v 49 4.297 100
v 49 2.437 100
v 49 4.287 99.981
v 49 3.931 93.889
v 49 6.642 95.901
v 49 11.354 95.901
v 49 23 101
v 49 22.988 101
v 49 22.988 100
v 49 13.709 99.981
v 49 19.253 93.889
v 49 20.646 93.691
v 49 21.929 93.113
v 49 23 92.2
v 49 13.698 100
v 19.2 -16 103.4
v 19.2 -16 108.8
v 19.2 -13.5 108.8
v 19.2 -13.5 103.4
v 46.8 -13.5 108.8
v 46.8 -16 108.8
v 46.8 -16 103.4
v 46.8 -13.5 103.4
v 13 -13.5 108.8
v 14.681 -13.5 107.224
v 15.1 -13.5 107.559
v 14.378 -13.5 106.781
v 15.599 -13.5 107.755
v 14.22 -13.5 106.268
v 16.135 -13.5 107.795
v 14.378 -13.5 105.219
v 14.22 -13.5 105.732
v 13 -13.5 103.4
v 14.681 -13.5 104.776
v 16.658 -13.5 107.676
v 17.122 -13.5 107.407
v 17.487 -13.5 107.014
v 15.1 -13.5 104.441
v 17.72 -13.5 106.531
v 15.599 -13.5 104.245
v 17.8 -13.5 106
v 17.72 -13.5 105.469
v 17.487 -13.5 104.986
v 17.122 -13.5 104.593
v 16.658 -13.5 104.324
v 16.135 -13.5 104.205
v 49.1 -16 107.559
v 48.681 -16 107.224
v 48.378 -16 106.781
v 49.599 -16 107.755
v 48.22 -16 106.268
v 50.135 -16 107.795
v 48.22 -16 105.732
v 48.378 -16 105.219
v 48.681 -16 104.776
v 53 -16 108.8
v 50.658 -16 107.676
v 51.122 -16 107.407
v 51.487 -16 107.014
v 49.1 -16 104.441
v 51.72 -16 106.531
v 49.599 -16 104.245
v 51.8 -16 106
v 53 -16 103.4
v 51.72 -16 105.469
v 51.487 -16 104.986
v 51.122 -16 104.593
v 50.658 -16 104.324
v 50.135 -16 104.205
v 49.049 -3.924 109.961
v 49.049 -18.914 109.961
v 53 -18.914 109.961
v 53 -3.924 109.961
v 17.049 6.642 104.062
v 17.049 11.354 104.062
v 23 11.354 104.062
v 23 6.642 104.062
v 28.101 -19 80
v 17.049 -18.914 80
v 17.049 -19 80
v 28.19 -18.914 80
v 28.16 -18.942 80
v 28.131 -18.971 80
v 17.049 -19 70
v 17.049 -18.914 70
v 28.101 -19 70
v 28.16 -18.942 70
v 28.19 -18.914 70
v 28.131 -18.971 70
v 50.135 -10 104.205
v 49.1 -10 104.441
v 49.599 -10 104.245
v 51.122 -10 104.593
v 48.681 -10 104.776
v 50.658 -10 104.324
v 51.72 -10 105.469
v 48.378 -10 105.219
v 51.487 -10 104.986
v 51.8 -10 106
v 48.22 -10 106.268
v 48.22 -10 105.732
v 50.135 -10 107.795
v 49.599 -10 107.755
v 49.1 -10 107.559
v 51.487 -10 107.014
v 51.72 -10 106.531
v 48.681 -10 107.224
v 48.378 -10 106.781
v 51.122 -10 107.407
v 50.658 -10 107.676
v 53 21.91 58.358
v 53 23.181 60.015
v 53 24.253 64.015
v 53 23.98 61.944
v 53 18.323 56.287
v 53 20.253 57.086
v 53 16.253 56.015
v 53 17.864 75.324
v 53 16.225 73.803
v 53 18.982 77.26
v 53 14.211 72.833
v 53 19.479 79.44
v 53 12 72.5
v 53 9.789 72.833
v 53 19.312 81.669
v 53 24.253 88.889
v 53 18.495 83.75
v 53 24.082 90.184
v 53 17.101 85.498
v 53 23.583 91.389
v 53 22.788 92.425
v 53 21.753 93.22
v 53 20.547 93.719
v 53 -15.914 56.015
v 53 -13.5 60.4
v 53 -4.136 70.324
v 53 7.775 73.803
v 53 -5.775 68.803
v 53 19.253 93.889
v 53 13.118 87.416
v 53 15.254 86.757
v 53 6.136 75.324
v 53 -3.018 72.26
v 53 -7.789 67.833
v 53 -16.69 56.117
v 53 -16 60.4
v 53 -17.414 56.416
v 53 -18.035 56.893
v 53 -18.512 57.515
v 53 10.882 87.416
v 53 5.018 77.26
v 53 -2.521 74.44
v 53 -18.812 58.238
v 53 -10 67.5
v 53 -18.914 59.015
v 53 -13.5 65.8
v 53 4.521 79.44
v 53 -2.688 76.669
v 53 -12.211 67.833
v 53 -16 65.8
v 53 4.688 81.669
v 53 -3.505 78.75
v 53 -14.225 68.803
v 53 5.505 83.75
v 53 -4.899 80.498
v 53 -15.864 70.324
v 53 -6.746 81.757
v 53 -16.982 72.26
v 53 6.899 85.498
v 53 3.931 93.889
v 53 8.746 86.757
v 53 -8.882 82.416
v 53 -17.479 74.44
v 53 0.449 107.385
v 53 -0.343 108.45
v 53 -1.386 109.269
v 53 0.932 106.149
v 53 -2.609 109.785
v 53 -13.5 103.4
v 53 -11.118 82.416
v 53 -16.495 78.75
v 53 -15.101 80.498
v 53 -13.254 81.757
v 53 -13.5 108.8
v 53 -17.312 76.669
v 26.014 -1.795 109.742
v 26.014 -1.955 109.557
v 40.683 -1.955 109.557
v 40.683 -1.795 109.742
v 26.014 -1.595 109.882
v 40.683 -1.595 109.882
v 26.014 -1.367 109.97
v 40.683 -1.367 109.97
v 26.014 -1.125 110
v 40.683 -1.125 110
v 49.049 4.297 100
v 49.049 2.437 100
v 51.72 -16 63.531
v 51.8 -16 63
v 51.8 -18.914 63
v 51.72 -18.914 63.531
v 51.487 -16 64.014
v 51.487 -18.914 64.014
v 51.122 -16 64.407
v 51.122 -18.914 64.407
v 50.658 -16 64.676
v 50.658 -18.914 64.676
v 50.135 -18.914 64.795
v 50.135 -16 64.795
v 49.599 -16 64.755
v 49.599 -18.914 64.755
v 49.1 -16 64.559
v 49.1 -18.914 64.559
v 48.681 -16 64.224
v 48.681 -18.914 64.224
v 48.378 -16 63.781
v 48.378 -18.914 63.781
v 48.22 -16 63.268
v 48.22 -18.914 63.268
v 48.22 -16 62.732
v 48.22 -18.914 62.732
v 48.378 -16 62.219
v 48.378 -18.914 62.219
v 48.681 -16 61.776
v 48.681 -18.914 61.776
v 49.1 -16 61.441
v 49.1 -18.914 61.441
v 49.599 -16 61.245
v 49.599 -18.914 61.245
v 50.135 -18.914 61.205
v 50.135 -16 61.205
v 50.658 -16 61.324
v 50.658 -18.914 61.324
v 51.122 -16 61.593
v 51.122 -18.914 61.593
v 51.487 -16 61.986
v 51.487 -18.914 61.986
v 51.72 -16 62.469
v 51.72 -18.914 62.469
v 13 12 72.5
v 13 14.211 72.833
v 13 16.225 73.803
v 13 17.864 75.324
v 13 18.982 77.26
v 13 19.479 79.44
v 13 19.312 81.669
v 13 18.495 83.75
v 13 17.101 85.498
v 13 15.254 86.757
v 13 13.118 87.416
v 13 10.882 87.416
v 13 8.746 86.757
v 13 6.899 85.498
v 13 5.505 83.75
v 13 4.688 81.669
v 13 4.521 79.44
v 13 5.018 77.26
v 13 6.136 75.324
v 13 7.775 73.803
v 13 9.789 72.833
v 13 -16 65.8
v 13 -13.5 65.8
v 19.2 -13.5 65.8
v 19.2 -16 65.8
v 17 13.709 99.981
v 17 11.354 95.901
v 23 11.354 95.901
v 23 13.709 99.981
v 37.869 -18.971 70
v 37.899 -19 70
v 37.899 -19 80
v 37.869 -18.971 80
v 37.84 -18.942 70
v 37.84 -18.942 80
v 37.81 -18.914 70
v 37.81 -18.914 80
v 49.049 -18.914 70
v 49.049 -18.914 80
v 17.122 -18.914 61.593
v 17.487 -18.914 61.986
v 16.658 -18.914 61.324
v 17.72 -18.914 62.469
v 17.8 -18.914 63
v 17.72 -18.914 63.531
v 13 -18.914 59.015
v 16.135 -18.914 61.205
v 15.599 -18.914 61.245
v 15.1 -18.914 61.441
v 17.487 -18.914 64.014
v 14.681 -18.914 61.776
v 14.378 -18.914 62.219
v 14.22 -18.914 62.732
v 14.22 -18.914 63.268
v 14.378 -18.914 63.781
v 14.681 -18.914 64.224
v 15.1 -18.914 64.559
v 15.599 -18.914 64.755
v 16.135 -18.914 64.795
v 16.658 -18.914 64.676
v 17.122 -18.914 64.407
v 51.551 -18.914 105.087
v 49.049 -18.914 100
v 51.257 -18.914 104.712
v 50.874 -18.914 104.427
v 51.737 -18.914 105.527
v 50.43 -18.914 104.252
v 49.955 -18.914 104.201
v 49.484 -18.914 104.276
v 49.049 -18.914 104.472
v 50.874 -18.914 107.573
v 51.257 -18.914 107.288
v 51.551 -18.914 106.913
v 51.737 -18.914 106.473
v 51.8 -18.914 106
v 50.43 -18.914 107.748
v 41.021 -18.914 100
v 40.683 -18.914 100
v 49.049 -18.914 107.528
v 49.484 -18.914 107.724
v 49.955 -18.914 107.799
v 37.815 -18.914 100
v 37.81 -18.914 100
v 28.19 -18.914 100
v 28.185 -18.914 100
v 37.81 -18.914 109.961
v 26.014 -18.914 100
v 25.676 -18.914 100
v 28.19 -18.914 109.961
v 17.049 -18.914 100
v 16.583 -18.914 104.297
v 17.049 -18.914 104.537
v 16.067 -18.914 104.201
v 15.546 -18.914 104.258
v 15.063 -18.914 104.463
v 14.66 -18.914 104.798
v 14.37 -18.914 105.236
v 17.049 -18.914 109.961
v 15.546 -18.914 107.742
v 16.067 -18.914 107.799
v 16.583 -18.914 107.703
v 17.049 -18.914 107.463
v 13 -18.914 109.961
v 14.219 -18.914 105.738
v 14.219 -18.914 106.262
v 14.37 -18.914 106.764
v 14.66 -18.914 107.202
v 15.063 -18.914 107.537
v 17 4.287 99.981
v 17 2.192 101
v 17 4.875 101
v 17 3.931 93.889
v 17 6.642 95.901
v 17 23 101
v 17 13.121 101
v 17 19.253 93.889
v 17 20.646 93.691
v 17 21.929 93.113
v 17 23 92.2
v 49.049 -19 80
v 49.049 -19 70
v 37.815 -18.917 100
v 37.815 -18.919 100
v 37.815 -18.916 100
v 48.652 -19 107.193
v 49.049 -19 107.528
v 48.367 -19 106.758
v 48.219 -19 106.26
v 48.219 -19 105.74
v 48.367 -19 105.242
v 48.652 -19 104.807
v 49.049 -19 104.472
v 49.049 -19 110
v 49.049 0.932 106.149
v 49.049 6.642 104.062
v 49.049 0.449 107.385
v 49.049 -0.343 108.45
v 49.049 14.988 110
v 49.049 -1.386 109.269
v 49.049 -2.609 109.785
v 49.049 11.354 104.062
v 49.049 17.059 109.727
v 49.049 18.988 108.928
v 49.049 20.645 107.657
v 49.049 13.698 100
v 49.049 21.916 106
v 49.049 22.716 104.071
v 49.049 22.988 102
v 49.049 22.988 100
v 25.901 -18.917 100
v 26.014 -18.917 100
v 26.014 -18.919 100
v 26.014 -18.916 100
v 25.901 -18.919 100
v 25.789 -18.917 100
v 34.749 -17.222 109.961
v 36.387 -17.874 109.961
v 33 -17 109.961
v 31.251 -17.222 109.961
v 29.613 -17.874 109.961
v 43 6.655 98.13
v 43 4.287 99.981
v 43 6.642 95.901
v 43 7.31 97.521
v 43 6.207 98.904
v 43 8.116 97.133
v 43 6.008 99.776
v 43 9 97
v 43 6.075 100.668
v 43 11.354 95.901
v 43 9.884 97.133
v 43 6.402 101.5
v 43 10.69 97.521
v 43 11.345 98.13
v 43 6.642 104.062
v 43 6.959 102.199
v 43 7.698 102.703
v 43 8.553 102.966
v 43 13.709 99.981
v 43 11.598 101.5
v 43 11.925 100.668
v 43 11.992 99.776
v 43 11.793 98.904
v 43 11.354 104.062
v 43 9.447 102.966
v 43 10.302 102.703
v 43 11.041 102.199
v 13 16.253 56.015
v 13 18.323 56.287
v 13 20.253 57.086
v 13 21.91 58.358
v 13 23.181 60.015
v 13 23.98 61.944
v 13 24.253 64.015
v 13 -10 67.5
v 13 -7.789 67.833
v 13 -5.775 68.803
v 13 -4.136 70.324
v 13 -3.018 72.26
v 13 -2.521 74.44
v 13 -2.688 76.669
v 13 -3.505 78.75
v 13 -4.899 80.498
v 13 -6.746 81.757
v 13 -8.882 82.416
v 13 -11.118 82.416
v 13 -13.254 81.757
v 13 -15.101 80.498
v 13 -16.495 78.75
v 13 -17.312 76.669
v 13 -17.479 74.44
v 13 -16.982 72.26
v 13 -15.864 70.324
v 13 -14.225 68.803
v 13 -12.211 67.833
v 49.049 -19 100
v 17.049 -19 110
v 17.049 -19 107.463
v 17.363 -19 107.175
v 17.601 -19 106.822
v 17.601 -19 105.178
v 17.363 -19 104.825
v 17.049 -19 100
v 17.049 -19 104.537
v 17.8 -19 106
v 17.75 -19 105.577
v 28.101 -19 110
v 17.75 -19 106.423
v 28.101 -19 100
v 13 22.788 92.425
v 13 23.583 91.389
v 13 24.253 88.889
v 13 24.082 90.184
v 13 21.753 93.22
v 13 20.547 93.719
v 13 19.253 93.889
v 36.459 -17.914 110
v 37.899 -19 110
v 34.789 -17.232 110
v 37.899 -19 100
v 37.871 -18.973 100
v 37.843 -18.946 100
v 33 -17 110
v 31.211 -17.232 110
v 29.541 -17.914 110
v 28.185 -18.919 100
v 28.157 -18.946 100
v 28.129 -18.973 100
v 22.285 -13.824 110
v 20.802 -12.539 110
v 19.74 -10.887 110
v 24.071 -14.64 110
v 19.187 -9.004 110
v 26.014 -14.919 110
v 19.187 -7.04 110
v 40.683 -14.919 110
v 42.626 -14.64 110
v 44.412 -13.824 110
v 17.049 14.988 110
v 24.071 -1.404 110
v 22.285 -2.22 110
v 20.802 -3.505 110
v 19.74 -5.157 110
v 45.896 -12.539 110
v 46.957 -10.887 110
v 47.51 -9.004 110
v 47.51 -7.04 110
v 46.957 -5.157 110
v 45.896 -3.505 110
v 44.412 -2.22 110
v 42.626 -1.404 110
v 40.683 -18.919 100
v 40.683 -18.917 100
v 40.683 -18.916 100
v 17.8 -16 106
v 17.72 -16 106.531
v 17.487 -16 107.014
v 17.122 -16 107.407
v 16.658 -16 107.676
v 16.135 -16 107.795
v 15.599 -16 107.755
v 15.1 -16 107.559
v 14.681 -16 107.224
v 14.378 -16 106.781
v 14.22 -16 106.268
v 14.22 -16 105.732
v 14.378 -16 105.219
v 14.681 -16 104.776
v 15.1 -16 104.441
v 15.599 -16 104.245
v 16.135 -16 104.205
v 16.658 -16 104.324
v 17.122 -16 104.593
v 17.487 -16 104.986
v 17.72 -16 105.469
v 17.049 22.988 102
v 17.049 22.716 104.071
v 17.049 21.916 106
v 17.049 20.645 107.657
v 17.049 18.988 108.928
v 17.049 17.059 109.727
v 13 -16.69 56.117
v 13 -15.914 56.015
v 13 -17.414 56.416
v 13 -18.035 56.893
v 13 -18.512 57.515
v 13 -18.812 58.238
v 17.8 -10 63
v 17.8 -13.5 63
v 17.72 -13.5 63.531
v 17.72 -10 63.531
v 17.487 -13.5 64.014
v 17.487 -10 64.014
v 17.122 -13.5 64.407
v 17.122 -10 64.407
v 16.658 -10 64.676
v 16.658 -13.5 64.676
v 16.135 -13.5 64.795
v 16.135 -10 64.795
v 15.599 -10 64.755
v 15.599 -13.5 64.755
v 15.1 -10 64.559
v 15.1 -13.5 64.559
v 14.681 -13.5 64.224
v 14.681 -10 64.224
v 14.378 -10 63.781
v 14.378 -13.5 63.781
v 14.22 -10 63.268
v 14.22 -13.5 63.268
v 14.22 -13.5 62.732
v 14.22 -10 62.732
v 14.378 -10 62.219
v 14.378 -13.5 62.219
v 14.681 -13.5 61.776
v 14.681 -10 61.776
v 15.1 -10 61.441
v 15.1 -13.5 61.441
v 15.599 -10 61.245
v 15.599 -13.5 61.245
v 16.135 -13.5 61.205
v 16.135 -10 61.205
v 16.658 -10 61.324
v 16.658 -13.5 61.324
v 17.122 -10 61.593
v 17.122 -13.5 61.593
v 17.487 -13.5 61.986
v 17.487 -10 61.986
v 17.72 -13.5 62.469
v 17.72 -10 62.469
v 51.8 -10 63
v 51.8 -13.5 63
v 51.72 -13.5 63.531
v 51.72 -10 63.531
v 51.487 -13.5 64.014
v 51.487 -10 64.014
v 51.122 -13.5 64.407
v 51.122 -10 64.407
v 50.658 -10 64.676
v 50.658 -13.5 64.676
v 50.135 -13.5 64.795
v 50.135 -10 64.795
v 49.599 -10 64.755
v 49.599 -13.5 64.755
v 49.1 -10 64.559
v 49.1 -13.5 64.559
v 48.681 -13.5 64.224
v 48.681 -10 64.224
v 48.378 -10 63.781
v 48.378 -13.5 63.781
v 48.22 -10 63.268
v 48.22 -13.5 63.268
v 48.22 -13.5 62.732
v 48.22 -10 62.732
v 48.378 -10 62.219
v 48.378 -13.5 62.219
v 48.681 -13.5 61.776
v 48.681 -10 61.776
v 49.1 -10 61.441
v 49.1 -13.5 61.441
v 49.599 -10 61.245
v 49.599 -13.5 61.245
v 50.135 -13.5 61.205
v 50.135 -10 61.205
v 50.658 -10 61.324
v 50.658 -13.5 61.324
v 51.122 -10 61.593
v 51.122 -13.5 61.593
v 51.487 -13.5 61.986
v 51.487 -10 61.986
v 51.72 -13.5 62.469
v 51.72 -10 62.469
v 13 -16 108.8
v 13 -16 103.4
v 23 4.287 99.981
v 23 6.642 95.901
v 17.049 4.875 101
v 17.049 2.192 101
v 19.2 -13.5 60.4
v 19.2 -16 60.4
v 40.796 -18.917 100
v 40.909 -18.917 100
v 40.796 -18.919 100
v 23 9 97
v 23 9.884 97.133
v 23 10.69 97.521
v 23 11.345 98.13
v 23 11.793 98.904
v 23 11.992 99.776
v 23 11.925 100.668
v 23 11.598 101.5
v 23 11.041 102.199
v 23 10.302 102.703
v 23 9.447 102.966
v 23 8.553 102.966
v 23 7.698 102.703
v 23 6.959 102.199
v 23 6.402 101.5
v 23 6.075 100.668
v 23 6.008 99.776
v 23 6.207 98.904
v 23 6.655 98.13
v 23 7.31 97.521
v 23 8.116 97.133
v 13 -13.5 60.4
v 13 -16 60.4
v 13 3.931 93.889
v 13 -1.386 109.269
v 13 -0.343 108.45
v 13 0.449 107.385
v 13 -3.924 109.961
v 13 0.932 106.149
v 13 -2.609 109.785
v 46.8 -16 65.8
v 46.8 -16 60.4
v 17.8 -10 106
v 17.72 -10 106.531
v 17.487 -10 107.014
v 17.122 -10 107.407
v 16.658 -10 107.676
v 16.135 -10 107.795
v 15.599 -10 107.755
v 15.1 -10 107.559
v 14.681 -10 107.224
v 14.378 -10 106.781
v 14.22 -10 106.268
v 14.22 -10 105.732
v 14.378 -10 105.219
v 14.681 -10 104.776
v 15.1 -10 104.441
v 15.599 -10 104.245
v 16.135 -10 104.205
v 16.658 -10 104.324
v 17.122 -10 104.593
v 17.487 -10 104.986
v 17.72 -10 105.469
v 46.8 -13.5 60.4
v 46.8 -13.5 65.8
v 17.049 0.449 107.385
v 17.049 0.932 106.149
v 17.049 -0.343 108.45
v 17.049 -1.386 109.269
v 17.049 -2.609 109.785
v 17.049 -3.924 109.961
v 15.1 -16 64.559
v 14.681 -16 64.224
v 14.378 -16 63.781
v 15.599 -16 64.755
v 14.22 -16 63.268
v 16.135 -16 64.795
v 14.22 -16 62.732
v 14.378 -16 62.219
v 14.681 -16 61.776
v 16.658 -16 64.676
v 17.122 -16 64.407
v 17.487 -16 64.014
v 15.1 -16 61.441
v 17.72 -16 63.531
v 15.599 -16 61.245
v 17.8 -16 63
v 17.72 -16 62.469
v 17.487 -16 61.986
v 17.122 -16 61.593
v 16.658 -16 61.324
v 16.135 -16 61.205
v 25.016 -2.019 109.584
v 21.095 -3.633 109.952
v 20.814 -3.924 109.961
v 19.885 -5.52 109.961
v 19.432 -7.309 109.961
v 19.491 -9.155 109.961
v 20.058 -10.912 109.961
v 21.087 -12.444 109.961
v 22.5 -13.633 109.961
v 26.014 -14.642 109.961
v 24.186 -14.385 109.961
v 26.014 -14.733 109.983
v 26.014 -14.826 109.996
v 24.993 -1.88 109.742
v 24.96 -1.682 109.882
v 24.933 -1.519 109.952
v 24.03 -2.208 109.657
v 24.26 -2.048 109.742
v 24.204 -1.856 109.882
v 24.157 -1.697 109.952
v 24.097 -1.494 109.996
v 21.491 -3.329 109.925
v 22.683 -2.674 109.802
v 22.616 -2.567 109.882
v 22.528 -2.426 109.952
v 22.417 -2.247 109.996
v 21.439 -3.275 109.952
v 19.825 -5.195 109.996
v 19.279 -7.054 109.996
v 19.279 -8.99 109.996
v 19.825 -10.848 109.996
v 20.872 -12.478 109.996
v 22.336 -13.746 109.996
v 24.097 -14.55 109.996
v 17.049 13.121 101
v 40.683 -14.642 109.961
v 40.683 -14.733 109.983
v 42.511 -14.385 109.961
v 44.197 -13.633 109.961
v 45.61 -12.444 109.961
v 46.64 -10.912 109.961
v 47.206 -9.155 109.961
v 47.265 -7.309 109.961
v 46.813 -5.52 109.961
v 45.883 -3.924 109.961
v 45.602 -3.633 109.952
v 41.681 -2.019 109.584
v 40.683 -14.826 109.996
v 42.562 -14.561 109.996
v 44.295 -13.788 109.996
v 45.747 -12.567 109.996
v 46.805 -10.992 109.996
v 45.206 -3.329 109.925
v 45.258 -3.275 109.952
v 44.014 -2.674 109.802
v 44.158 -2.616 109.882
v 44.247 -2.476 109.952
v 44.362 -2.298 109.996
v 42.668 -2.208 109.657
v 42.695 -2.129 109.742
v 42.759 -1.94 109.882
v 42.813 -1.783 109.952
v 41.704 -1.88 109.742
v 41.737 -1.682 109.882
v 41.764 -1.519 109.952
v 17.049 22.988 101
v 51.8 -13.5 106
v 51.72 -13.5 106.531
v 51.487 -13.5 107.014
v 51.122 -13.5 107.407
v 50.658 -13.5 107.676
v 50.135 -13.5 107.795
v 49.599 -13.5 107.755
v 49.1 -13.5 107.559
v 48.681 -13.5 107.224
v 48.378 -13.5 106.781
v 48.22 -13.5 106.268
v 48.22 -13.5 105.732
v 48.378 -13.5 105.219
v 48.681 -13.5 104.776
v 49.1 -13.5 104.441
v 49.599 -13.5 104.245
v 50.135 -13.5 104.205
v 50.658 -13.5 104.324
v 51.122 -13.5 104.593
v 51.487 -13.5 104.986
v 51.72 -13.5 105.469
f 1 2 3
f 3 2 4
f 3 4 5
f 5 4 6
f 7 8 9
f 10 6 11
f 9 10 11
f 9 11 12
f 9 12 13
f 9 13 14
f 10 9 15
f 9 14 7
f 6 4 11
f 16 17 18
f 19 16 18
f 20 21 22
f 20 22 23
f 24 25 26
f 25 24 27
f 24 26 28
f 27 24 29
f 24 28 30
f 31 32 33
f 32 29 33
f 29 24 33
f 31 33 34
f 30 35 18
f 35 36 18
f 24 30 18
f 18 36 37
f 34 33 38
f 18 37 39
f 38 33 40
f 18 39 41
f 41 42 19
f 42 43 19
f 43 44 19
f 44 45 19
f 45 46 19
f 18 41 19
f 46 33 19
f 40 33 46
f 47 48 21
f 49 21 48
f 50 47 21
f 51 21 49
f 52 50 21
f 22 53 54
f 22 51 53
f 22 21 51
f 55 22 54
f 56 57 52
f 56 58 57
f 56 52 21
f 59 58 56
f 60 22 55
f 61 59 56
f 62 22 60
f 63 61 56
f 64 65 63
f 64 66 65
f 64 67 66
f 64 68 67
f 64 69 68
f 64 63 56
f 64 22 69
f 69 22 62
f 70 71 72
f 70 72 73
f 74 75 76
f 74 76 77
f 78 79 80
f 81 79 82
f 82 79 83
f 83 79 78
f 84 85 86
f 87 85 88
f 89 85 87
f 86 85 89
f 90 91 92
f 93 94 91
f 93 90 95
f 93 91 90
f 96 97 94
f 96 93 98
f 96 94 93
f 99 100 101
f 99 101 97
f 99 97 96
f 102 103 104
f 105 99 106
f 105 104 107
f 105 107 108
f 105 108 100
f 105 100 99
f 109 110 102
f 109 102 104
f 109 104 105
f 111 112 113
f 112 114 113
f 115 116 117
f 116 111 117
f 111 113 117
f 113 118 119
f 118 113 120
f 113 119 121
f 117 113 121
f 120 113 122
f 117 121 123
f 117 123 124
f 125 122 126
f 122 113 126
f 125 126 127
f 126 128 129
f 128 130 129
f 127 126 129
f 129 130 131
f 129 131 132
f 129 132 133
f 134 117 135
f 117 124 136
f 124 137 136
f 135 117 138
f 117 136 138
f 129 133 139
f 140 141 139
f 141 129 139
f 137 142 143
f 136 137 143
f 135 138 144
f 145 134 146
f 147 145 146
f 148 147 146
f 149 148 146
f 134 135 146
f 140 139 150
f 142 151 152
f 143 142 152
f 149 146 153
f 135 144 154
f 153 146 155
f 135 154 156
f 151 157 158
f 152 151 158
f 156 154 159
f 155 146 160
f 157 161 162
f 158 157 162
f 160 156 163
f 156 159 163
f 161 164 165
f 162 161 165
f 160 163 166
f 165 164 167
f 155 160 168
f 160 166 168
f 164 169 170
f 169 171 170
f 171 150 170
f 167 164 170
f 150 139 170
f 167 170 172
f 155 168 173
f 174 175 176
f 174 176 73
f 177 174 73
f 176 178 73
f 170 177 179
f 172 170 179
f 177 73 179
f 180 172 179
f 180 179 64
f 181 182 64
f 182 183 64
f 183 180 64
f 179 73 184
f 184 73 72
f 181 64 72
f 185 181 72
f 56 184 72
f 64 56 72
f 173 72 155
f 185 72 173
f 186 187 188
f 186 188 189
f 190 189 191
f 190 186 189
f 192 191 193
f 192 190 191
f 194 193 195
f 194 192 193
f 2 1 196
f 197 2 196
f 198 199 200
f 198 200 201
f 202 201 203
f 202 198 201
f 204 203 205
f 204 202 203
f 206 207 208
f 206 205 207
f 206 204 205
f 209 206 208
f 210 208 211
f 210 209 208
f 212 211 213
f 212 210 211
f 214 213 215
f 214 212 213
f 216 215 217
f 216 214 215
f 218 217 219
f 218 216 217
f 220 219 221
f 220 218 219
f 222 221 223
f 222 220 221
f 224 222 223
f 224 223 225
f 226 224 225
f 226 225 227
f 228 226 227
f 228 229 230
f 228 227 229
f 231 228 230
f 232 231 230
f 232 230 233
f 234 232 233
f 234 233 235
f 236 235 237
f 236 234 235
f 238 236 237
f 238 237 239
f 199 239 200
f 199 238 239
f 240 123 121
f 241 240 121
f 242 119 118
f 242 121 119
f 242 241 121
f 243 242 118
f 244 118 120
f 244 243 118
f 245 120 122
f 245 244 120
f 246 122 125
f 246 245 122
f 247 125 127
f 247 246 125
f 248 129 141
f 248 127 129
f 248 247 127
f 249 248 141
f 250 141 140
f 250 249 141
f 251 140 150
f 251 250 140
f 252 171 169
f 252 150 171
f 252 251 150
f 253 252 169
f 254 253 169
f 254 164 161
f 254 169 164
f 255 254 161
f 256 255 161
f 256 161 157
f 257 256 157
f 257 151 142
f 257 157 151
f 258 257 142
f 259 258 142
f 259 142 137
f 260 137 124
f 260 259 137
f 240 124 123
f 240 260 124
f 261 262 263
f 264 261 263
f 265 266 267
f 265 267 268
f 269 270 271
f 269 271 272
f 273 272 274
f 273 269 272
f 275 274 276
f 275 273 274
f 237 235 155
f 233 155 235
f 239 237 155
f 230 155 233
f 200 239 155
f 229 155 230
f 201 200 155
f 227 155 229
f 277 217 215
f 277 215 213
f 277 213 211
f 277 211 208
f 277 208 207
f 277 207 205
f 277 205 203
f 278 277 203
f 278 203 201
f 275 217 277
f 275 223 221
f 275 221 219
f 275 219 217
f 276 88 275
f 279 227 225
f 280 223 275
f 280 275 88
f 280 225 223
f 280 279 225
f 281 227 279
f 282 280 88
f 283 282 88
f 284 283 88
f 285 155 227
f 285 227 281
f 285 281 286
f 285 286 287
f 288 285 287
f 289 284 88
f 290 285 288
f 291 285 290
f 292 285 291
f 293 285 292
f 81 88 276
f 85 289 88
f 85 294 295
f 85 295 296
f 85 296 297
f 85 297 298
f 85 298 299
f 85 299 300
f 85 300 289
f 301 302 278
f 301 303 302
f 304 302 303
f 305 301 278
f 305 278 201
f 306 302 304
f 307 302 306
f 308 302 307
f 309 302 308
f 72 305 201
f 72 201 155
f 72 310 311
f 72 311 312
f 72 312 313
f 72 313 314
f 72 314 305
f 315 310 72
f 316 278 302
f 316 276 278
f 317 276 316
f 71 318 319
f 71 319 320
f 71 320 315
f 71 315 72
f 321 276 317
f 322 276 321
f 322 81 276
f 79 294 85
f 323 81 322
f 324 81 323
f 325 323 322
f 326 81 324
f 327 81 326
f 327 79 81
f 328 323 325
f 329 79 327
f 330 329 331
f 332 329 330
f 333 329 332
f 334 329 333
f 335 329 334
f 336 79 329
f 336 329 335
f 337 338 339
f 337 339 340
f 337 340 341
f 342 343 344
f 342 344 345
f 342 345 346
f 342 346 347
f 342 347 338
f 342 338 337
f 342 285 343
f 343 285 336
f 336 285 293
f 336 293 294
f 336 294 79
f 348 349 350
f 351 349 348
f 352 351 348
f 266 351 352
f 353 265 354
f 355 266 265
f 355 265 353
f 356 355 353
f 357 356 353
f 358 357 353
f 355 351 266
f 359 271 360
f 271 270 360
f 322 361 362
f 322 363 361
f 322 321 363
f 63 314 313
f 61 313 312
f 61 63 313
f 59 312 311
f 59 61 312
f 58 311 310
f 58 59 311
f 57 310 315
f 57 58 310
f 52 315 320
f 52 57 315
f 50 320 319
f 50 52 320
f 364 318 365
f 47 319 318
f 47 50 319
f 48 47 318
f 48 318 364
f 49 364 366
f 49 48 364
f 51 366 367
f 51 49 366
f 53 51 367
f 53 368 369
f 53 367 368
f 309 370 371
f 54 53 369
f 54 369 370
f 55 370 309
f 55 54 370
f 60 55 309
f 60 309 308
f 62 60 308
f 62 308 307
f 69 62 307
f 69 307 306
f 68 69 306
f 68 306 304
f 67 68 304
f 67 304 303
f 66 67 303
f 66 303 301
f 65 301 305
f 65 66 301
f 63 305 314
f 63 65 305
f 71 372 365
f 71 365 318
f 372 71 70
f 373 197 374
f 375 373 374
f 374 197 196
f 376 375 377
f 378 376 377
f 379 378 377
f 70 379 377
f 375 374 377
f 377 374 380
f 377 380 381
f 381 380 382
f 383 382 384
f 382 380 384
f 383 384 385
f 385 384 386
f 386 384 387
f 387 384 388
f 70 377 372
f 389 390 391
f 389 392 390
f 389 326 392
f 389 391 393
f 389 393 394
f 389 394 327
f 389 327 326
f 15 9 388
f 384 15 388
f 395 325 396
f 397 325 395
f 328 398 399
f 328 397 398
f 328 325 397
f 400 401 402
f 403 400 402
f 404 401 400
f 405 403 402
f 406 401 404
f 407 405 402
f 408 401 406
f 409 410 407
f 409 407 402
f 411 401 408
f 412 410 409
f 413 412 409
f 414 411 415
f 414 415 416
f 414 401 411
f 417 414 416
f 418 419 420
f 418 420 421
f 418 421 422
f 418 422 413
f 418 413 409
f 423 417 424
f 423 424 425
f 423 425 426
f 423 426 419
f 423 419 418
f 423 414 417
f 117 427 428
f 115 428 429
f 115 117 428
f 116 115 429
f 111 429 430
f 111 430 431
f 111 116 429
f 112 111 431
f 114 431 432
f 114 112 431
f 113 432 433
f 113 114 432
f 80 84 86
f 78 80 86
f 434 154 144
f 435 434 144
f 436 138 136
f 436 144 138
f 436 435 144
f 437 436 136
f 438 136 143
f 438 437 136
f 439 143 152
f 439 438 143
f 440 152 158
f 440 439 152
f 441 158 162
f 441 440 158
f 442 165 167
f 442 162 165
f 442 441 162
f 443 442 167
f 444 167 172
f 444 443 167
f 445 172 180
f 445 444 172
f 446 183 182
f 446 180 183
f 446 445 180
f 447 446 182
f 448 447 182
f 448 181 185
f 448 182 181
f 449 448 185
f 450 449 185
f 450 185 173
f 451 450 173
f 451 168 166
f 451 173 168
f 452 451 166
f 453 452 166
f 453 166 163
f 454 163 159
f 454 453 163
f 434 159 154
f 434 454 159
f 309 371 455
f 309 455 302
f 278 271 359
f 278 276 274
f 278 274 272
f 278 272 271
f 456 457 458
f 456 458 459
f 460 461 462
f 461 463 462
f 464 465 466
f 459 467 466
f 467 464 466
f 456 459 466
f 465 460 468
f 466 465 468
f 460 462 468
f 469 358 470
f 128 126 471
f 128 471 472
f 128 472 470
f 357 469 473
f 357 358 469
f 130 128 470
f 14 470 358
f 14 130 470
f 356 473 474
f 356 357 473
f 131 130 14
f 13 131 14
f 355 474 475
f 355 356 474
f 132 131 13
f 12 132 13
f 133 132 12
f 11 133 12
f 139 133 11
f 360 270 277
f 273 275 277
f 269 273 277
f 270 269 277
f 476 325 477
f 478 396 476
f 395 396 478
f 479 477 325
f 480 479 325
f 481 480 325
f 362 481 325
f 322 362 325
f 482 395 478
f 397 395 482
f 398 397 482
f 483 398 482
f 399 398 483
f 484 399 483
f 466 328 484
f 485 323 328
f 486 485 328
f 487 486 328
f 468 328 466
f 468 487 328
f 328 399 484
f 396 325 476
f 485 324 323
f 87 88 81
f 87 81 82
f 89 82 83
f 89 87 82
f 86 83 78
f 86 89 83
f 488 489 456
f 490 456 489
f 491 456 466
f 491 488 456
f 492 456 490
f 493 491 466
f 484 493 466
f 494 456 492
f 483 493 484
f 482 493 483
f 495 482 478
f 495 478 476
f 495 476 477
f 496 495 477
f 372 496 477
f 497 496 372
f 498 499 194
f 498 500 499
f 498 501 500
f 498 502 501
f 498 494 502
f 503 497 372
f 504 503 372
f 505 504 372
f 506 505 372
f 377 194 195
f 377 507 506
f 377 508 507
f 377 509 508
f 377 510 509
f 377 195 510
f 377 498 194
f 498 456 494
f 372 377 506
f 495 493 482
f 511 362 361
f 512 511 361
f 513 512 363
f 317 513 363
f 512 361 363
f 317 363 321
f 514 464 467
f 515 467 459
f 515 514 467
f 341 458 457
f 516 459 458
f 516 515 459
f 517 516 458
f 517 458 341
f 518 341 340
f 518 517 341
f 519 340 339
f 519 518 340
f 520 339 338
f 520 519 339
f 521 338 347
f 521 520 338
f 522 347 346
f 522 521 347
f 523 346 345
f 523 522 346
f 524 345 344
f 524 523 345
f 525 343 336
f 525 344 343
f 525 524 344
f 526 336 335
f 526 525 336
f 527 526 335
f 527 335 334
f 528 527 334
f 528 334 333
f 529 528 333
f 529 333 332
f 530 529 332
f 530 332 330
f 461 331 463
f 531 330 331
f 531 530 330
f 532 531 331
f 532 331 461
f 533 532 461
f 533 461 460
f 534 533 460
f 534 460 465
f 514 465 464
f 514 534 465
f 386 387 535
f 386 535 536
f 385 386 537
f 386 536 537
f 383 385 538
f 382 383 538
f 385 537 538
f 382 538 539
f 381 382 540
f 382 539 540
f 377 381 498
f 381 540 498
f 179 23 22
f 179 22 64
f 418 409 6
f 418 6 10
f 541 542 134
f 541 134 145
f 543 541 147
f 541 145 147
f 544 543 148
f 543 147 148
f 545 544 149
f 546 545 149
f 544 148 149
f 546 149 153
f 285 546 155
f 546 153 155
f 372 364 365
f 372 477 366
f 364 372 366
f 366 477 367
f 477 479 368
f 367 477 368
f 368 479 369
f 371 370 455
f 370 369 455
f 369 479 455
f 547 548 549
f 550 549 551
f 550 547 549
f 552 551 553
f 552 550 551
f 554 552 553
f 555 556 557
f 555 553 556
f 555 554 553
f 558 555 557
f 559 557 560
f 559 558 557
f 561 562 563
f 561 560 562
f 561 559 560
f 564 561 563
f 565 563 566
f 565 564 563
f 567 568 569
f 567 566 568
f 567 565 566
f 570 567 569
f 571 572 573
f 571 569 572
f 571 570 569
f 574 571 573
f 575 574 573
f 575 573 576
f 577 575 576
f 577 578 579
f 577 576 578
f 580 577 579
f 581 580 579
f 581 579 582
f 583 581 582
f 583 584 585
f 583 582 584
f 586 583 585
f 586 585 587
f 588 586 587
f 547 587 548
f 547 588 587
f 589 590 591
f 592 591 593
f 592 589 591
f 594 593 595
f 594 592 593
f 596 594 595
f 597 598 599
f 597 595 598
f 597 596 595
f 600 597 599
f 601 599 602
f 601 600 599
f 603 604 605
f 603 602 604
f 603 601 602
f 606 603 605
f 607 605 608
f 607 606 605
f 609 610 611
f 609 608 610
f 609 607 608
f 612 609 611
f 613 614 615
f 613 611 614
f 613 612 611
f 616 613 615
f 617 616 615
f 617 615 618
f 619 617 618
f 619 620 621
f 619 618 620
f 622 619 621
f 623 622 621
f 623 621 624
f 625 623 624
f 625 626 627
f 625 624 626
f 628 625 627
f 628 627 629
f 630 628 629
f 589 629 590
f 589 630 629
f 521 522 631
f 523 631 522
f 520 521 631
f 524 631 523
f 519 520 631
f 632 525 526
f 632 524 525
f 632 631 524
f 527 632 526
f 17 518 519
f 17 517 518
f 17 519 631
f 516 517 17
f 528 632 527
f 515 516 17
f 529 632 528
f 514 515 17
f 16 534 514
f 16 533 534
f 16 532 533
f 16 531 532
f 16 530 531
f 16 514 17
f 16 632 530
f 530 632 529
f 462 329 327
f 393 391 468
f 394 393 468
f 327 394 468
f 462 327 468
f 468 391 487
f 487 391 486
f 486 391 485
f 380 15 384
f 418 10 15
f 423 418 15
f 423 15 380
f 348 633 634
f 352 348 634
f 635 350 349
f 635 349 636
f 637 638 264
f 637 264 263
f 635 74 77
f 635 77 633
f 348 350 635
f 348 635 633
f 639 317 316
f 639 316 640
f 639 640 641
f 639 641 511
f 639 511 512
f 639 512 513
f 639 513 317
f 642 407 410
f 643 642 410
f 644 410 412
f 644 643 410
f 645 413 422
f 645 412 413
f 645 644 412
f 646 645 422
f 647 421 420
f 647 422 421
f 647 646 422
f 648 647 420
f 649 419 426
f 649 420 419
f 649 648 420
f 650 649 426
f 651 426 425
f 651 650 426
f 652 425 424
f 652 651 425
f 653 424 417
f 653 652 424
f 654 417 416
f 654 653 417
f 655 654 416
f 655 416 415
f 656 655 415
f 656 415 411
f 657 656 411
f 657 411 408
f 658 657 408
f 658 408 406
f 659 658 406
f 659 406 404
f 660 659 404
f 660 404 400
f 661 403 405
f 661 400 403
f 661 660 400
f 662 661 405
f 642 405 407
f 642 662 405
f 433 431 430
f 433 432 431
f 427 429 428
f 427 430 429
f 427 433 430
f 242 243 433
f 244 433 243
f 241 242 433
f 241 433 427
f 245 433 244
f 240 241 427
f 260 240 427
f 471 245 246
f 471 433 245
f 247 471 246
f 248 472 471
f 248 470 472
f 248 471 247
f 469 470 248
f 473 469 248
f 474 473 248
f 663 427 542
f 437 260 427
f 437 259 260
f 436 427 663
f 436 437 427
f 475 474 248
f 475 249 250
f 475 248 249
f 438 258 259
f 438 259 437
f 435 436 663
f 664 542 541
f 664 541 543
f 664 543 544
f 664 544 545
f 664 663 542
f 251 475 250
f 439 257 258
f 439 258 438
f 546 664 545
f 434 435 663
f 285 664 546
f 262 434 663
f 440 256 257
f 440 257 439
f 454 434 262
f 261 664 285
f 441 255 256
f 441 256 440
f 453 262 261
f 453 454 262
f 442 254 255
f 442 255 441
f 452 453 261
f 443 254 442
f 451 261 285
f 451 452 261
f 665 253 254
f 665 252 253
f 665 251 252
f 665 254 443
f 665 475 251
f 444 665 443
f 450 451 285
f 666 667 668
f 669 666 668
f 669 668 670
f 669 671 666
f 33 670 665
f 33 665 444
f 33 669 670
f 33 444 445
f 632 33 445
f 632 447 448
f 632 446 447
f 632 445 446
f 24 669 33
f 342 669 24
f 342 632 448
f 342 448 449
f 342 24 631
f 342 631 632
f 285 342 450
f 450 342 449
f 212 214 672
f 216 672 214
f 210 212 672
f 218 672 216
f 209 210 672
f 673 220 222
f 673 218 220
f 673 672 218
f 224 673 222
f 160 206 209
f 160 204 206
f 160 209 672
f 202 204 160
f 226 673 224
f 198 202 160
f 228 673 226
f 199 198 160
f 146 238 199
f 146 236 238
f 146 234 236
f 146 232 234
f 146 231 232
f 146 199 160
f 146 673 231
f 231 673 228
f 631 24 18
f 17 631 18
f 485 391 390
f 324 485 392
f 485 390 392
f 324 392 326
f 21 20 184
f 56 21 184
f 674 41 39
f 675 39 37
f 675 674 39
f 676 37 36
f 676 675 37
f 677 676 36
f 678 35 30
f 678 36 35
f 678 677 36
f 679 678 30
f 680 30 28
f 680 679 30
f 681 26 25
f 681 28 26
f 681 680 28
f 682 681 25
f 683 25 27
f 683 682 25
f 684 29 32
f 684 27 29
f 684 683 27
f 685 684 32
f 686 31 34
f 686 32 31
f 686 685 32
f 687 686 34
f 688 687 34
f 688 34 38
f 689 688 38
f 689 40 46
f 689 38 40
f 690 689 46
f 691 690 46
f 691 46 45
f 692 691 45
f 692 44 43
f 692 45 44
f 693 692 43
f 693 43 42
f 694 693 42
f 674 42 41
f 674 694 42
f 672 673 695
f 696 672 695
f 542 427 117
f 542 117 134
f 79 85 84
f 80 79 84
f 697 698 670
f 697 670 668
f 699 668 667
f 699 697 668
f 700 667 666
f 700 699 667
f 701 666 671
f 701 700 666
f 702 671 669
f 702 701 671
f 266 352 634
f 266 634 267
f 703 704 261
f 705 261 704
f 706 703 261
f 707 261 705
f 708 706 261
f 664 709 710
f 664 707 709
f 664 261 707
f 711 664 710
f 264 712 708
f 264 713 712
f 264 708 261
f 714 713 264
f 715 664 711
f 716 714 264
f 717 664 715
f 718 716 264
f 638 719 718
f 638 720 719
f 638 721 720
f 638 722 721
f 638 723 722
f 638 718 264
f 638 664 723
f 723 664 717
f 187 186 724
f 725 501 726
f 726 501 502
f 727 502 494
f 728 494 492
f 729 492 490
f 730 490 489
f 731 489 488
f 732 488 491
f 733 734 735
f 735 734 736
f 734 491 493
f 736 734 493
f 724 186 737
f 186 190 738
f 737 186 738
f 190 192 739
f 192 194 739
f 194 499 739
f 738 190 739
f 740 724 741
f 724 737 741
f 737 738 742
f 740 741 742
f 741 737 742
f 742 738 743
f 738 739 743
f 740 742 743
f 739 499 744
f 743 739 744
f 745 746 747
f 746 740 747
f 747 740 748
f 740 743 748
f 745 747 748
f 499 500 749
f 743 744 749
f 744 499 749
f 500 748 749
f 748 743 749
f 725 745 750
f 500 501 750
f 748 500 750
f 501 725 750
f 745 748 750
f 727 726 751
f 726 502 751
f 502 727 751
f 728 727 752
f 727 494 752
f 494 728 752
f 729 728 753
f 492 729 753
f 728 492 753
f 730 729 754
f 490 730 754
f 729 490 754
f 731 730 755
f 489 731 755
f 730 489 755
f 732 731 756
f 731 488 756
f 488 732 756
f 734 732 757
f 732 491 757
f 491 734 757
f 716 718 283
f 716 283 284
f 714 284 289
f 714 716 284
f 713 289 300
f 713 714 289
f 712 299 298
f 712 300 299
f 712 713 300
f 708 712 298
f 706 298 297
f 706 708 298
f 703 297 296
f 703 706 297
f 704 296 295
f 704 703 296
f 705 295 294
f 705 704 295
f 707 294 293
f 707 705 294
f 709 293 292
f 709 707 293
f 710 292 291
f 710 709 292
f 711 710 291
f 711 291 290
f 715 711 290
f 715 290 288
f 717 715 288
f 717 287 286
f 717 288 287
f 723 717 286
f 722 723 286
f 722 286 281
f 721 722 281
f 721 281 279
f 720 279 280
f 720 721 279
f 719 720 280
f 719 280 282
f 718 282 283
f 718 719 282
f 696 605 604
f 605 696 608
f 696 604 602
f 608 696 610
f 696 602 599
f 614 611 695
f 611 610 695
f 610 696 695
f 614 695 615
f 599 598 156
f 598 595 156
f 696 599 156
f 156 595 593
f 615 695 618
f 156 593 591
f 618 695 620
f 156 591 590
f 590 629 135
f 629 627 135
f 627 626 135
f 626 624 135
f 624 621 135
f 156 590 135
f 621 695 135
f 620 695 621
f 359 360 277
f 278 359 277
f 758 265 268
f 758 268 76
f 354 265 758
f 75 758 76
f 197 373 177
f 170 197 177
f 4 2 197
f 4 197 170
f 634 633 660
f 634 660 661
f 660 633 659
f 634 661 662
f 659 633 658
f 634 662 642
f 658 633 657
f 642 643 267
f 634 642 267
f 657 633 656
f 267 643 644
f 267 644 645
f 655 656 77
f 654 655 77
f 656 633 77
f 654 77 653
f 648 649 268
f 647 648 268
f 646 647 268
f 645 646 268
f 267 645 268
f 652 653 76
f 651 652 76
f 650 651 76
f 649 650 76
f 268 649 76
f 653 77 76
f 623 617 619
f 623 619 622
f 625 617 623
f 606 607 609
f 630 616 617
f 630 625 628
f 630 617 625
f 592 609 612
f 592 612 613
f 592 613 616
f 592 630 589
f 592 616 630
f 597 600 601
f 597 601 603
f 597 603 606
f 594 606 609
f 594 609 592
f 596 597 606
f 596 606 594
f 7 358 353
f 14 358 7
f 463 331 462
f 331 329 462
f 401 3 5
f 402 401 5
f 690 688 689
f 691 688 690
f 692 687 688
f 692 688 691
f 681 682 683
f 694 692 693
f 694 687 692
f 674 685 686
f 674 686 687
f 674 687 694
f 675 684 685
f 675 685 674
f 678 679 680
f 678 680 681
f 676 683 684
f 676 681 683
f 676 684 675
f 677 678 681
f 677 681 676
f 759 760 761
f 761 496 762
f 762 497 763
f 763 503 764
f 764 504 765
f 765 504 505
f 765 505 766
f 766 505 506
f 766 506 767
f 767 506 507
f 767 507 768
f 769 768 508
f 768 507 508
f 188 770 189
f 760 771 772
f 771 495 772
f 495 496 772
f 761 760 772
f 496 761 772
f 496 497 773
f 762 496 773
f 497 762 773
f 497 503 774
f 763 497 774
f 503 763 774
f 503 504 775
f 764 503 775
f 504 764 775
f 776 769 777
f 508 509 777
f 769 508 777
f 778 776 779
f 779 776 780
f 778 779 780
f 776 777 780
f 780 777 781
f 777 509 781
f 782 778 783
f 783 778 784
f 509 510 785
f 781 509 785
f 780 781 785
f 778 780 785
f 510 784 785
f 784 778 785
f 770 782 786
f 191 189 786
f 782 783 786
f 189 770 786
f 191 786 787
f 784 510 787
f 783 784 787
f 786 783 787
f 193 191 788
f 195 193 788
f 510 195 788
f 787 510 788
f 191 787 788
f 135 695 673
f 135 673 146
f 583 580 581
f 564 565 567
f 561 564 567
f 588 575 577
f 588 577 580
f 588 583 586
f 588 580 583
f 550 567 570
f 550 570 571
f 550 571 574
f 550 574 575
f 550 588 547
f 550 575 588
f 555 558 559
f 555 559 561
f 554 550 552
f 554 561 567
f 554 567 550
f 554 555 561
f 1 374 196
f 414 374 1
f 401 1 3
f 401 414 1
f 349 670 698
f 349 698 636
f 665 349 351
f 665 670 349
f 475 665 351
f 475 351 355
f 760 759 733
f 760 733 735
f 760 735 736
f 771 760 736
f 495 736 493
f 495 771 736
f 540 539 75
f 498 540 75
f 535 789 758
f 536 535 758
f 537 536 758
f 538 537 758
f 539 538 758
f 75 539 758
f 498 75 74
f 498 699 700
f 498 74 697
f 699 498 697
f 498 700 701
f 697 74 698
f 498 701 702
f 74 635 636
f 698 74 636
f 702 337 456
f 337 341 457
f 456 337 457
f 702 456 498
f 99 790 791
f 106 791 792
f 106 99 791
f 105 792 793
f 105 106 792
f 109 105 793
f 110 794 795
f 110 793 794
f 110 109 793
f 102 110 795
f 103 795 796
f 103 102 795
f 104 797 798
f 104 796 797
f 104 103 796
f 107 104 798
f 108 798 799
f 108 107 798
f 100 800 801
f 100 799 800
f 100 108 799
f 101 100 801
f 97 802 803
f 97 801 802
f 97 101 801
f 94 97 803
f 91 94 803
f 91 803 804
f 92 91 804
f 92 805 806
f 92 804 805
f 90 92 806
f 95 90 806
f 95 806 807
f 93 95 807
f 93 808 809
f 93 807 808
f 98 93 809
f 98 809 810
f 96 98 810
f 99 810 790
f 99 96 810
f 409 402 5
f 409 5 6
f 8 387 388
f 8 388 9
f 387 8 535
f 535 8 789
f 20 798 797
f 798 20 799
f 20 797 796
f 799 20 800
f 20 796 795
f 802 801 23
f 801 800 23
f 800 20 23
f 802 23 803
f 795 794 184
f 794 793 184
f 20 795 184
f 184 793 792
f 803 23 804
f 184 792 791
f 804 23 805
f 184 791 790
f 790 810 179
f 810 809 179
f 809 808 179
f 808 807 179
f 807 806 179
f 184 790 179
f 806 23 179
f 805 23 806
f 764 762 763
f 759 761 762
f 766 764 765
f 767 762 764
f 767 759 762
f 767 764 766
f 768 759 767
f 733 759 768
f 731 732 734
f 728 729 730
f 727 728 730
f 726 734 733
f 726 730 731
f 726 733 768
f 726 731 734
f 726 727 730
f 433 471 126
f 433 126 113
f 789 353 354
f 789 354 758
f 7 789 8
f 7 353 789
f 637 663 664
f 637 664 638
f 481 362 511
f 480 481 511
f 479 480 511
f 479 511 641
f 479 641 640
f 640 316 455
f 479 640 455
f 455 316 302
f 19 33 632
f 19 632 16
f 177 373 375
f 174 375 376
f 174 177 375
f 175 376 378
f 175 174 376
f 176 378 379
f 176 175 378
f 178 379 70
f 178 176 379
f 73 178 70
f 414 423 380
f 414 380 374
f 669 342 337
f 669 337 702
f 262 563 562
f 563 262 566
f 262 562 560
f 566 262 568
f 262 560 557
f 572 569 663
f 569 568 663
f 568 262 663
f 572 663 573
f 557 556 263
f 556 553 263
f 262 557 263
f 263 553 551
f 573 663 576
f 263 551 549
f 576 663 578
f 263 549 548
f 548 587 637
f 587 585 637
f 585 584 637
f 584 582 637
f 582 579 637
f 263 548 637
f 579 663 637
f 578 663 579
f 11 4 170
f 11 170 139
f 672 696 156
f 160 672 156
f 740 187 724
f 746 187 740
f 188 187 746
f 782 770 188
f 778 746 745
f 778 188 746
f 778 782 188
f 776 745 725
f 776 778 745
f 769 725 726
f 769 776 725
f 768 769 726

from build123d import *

# Parameters (mm, degrees)
CYLINDER078_R           = 7.5
CYLINDER078_DEPTH       = 180
CYLINDER078_PITCH_ANGLE = 90
CYLINDER090_R           = 7.5
CYLINDER090_DEPTH       = 180
CYLINDER090_PITCH_ANGLE = 90
CYLINDER099_R           = 1.8
CYLINDER099_DEPTH       = 34
CYLINDER099_ROLL_ANGLE  = 90
CYLINDER098_R           = 1.8
CYLINDER098_DEPTH       = 34
CYLINDER098_ROLL_ANGLE  = 90
CYLINDER101_R           = 1.8
CYLINDER101_DEPTH       = 34
CYLINDER101_ROLL_ANGLE  = 90
CYLINDER100_R           = 1.8
CYLINDER100_DEPTH       = 34
CYLINDER100_ROLL_ANGLE  = 90
BOX049_W                = 6.4
BOX049_H                = 2.5
BOX049_DEPTH            = 5.4
BOX050_W                = 6.4
BOX050_H                = 2.5
BOX050_DEPTH            = 5.4
BOX051_W                = 6.4
BOX051_H                = 2.5
BOX051_DEPTH            = 5.4
BOX052_W                = 6.4
BOX052_H                = 2.5
BOX052_DEPTH            = 5.4
BOX045_W                = 59
BOX045_H                = 21
BOX045_DEPTH            = 48
BOX044_W                = 3
BOX044_H                = 6
BOX044_DEPTH            = 23
CYLINDER095_R           = 1.4
CYLINDER095_DEPTH       = 10
CYLINDER095_ROLL_ANGLE  = 90
CYLINDER097_R           = 1.4
CYLINDER097_DEPTH       = 10
CYLINDER097_ROLL_ANGLE  = 90
CYLINDER094_R           = 5
CYLINDER094_DEPTH       = 5
CYLINDER094_ROLL_ANGLE  = 90
CYLINDER093_R           = 3
CYLINDER093_DEPTH       = 180
CYLINDER093_PITCH_ANGLE = 90
PAD050_DEPTH            = 10
PAD049_DEPTH            = 10
CYLINDER091_R           = 7.5
CYLINDER091_DEPTH       = 180
CYLINDER091_PITCH_ANGLE = 90
CYLINDER092_R           = 7
CYLINDER092_DEPTH       = 120
PAD048_DEPTH            = 10
PAD047_DEPTH            = 10
BOX043_W                = 32
BOX043_H                = 23
BOX043_DEPTH            = 22
FILLET029_R             = 5
FILLET030_R             = 8
FILLET031_R             = 8
FILLET032_R             = 3
FILLET033_R             = 1
FILLET034_R             = 1
FILLET035_R             = 1
FILLET036_R             = 1
CYLINDER096_R           = 5
CYLINDER096_DEPTH       = 5
CYLINDER096_ROLL_ANGLE  = 90
PAD052_DEPTH            = 40
FILLET041_R             = 3
FILLET042_R             = 8
FILLET043_R             = 5
FILLET044_R             = 5


with BuildPart() as m026:
    # Cylinder078 → Cylinder078 (new body)
    with BuildSketch(Plane.XY):
        Circle(CYLINDER078_R)
    extrude(amount=CYLINDER078_DEPTH)


with BuildPart() as m026_1:
    # Cylinder078 pitch: moved
    add(m026.part.rotate(Axis((0, 0, 0), (0, 1, 0)), CYLINDER078_PITCH_ANGLE))


with BuildPart() as m026_2:
    # Cylinder078 placement: moved
    add(m026_1.part.moved(Location((-8, 12, 80))))


with BuildPart() as m029:
    # Cylinder090 → Cylinder090 (new body)
    with BuildSketch(Plane.XY):
        Circle(CYLINDER090_R)
    extrude(amount=CYLINDER090_DEPTH)


with BuildPart() as m029_1:
    # Cylinder090 pitch: moved
    add(m029.part.rotate(Axis((0, 0, 0), (0, 1, 0)), CYLINDER090_PITCH_ANGLE))


with BuildPart() as m029_2:
    # Cylinder090 placement: moved
    add(m029_1.part.moved(Location((-9, -10, 75))))


with BuildPart() as cilindro055:
    # Cylinder099 → Cylinder099 (new body)
    with BuildSketch(Plane.XY):
        Circle(CYLINDER099_R)
    extrude(amount=CYLINDER099_DEPTH)


with BuildPart() as cilindro055_1:
    # Cylinder099 roll: moved
    add(cilindro055.part.rotate(Axis((0, 0, 0), (1, 0, 0)), CYLINDER099_ROLL_ANGLE))


with BuildPart() as cilindro055_2:
    # Cylinder099 placement: moved
    add(cilindro055_1.part.moved(Location((16, -10, 63))))


with BuildPart() as fusion050:
    # Cylinder098 → Cylinder098 (new body)
    with BuildSketch(Plane.XY):
        Circle(CYLINDER098_R)
    extrude(amount=CYLINDER098_DEPTH)


with BuildPart() as fusion050_1:
    # Cylinder098 roll: moved
    add(fusion050.part.rotate(Axis((0, 0, 0), (1, 0, 0)), CYLINDER098_ROLL_ANGLE))


with BuildPart() as fusion050_2:
    # Cylinder098 placement: moved
    add(fusion050_1.part.moved(Location((50, -10, 63))))

    # Fusion050: union Cilindro055
    add(cilindro055_2.part)


with BuildPart() as cilindro057:
    # Cylinder101 → Cylinder101 (new body)
    with BuildSketch(Plane.XY):
        Circle(CYLINDER101_R)
    extrude(amount=CYLINDER101_DEPTH)


with BuildPart() as cilindro057_1:
    # Cylinder101 roll: moved
    add(cilindro057.part.rotate(Axis((0, 0, 0), (1, 0, 0)), CYLINDER101_ROLL_ANGLE))


with BuildPart() as cilindro057_2:
    # Cylinder101 placement: moved
    add(cilindro057_1.part.moved(Location((16, -10, 63))))


with BuildPart() as fusion055:
    # Cylinder100 → Cylinder100 (new body)
    with BuildSketch(Plane.XY):
        Circle(CYLINDER100_R)
    extrude(amount=CYLINDER100_DEPTH)


with BuildPart() as fusion055_1:
    # Cylinder100 roll: moved
    add(fusion055.part.rotate(Axis((0, 0, 0), (1, 0, 0)), CYLINDER100_ROLL_ANGLE))


with BuildPart() as fusion055_2:
    # Cylinder100 placement: moved
    add(fusion055_1.part.moved(Location((50, -10, 63))))

    # Fusion051: union Cilindro057
    add(cilindro057_2.part)


with BuildPart() as fusion055_3:
    # Fusion051 placement: moved
    add(fusion055_2.part.moved(Location((0, 0, 43))))

    # Fusion055: union Fusion050
    add(fusion050_2.part)


with BuildPart() as cubo044:
    # Box049 → Box049 (new body)
    with BuildSketch(Plane(origin=(12.8, -23, 60.4), x_dir=(1, 0, 0), z_dir=(0, 0, 1))):
        with Locations((3.2, 1.25)):
            Rectangle(BOX049_W, BOX049_H)
    extrude(amount=BOX049_DEPTH)


with BuildPart() as fusion052:
    # Box050 → Box050 (new body)
    with BuildSketch(Plane(origin=(12.8, -23, 103.4), x_dir=(1, 0, 0), z_dir=(0, 0, 1))):
        with Locations((3.2, 1.25)):
            Rectangle(BOX050_W, BOX050_H)
    extrude(amount=BOX050_DEPTH)

    # Fusion052: union Cubo044
    add(cubo044.part)


with BuildPart() as cubo046:
    # Box051 → Box051 (new body)
    with BuildSketch(Plane(origin=(12.8, -23, 60.4), x_dir=(1, 0, 0), z_dir=(0, 0, 1))):
        with Locations((3.2, 1.25)):
            Rectangle(BOX051_W, BOX051_H)
    extrude(amount=BOX051_DEPTH)


with BuildPart() as fusion054:
    # Box052 → Box052 (new body)
    with BuildSketch(Plane(origin=(12.8, -23, 103.4), x_dir=(1, 0, 0), z_dir=(0, 0, 1))):
        with Locations((3.2, 1.25)):
            Rectangle(BOX052_W, BOX052_H)
    extrude(amount=BOX052_DEPTH)

    # Fusion053: union Cubo046
    add(cubo046.part)


with BuildPart() as fusion054_1:
    # Fusion053 placement: moved
    add(fusion054.part.moved(Location((34, 0, 0))))

    # Fusion054: union Fusion052
    add(fusion052.part)


with BuildPart() as fusion054_2:
    # Fusion054 placement: moved
    add(fusion054_1.part.moved(Location((0, 7, 0))))


with BuildPart() as cubo040:
    # Box045 → Box045 (new body)
    with BuildSketch(Plane(origin=(0, -40, 64), x_dir=(1, 0, 0), z_dir=(0, 0, 1))):
        with Locations((29.5, 10.5)):
            Rectangle(BOX045_W, BOX045_H)
    extrude(amount=BOX045_DEPTH)


with BuildPart() as cubo039:
    # Box044 → Box044 (new body)
    with BuildSketch(Plane(origin=(17, -11, 79), x_dir=(1, 0, 0), z_dir=(0, 0, 1))):
        with Locations((1.5, 3)):
            Rectangle(BOX044_W, BOX044_H)
    extrude(amount=BOX044_DEPTH)


with BuildPart() as cilindro051:
    # Cylinder095 → Cylinder095 (new body)
    with BuildSketch(Plane.XY):
        Circle(CYLINDER095_R)
    extrude(amount=CYLINDER095_DEPTH)


with BuildPart() as cilindro051_1:
    # Cylinder095 roll: moved
    add(cilindro051.part.rotate(Axis((0, 0, 0), (1, 0, 0)), CYLINDER095_ROLL_ANGLE))


with BuildPart() as cilindro051_2:
    # Cylinder095 placement: moved
    add(cilindro051_1.part.moved(Location((33, -27, 105))))


with BuildPart() as cilindro053:
    # Cylinder097 → Cylinder097 (new body)
    with BuildSketch(Plane.XY):
        Circle(CYLINDER097_R)
    extrude(amount=CYLINDER097_DEPTH)


with BuildPart() as cilindro053_1:
    # Cylinder097 roll: moved
    add(cilindro053.part.rotate(Axis((0, 0, 0), (1, 0, 0)), CYLINDER097_ROLL_ANGLE))


with BuildPart() as cilindro053_2:
    # Cylinder097 placement: moved
    add(cilindro053_1.part.moved(Location((33, -27, 75))))


with BuildPart() as cilindro050:
    # Cylinder094 → Cylinder094 (new body)
    with BuildSketch(Plane.XY):
        Circle(CYLINDER094_R)
    extrude(amount=CYLINDER094_DEPTH)


with BuildPart() as cilindro050_1:
    # Cylinder094 roll: moved
    add(cilindro050.part.rotate(Axis((0, 0, 0), (1, 0, 0)), CYLINDER094_ROLL_ANGLE))


with BuildPart() as cilindro050_2:
    # Cylinder094 placement: moved
    add(cilindro050_1.part.moved(Location((33, -31, 105))))


with BuildPart() as m031:
    # Cylinder093 → Cylinder093 (new body)
    with BuildSketch(Plane.XY):
        Circle(CYLINDER093_R)
    extrude(amount=CYLINDER093_DEPTH)


with BuildPart() as m031_1:
    # Cylinder093 pitch: moved
    add(m031.part.rotate(Axis((0, 0, 0), (0, 1, 0)), CYLINDER093_PITCH_ANGLE))


with BuildPart() as m031_2:
    # Cylinder093 placement: moved
    add(m031_1.part.moved(Location((-12, 9, 100))))


with BuildPart() as pad050:
    # Sketch057 → Pad050 (new body)
    with BuildSketch(Plane(origin=(43, 9, 0), x_dir=(0, 1, 0), z_dir=(1, 0, 0))):
        Polygon((-4.713422, 99.981385), (-2.357765, 95.901267), (2.35355, 95.901267), (4.709208, 99.981385), (2.35355, 104.061504), (-2.357765, 104.061504), align=None)
    extrude(amount=PAD050_DEPTH)


with BuildPart() as pad049:
    # Sketch056 → Pad049 (new body)
    with BuildSketch(Plane(origin=(13, 9, 0), x_dir=(0, 1, 0), z_dir=(1, 0, 0))):
        Polygon((-4.713422, 99.981385), (-2.357765, 95.901267), (2.35355, 95.901267), (4.709208, 99.981385), (2.35355, 104.061504), (-2.357765, 104.061504), align=None)
    extrude(amount=PAD049_DEPTH)


with BuildPart() as m030:
    # Cylinder091 → Cylinder091 (new body)
    with BuildSketch(Plane.XY):
        Circle(CYLINDER091_R)
    extrude(amount=CYLINDER091_DEPTH)


with BuildPart() as m030_1:
    # Cylinder091 pitch: moved
    add(m030.part.rotate(Axis((0, 0, 0), (0, 1, 0)), CYLINDER091_PITCH_ANGLE))


with BuildPart() as m030_2:
    # Cylinder091 placement: moved
    add(m030_1.part.moved(Location((-12, 12, 80))))


with BuildPart() as cilindro049:
    # Cylinder092 → Cylinder092 (new body)
    with BuildSketch(Plane(origin=(33, -24, 41), x_dir=(1, 0, 0), z_dir=(0, 0, 1))):
        Circle(CYLINDER092_R)
    extrude(amount=CYLINDER092_DEPTH)


with BuildPart() as pad048:
    # Sketch055 → Pad048 (new body)
    with BuildSketch(Plane.XY.offset(100)):
        Polygon((23.049006, -25.471541), (25.637042, -30.500033), (30.141413, -33.919727), (35.796642, -33.874552), (40.245807, -30.383337), (43.049006, -25.471541), (49.049006, -25.471541), (49.049006, 22.988138), (17.049006, 22.988138), (17.049006, -25.471541), align=None)
        with BuildLine():
            ThreePointArc((26.014116, -2.124694), (20.116872, -8.021937), (26.014116, -13.919181))
            Line((26.014116, -13.919181), (40.6833, -13.919181))
            ThreePointArc((40.6833, -13.919181), (46.580544, -8.021937), (40.6833, -2.124694))
            Line((26.014116, -2.124694), (40.6833, -2.124694))
        make_face(mode=Mode.SUBTRACT)
    extrude(amount=PAD048_DEPTH)


with BuildPart() as pad047:
    # Sketch054 → Pad047 (new body)
    with BuildSketch(Plane.XY.offset(70)):
        Polygon((23.049006, -25.471541), (25.637042, -30.500033), (30.141413, -33.919727), (35.796642, -33.874552), (40.245807, -30.383337), (43.049006, -25.471541), (49.049006, -25.471541), (49.049006, 22.988138), (17.049006, 22.988138), (17.049006, -25.471541), align=None)
        with BuildLine():
            ThreePointArc((26.014116, -2.124694), (20.116872, -8.021937), (26.014116, -13.919181))
            Line((26.014116, -13.919181), (40.6833, -13.919181))
            ThreePointArc((40.6833, -13.919181), (46.580544, -8.021937), (40.6833, -2.124694))
            Line((26.014116, -2.124694), (40.6833, -2.124694))
        make_face(mode=Mode.SUBTRACT)
    extrude(amount=PAD047_DEPTH)


with BuildPart() as fillet036:
    # Box043 → Box043 (new body)
    with BuildSketch(Plane(origin=(17, 0, 79), x_dir=(1, 0, 0), z_dir=(0, 0, 1))):
        with Locations((16, 11.5)):
            Rectangle(BOX043_W, BOX043_H)
    extrude(amount=BOX043_DEPTH)

    # Fusion046: union Pad048, Pad047
    add(pad048.part)
    add(pad047.part)

    # Cut113: cut Cilindro049
    add(cilindro049.part, mode=Mode.SUBTRACT)

    # Cut114: cut M030
    add(m030_2.part, mode=Mode.SUBTRACT)

    # Fillet029
    fillet029_edges = [fillet036.edges().sort_by_distance(p)[0] for p in [
        (33.348708, -2.124694, 100),
    ]]
    fillet(fillet029_edges, radius=FILLET029_R)

    # Fillet030
    fillet030_edges = [fillet036.edges().sort_by_distance(p)[0] for p in [
        (33.049006, 22.988138, 110),
    ]]
    fillet(fillet030_edges, radius=FILLET030_R)

    # Fillet031
    fillet031_edges = [fillet036.edges().sort_by_distance(p)[0] for p in [
        (33.049006, 22.988138, 70),
    ]]
    fillet(fillet031_edges, radius=FILLET031_R)

    # Fillet032
    fillet032_edges = [fillet036.edges().sort_by_distance(p)[0] for p in [
        (17.049006, -25.471541, 75),
        (49.049006, -25.471541, 75),
        (17.049006, -25.471541, 105),
        (49.049006, -25.471541, 105),
    ]]
    fillet(fillet032_edges, radius=FILLET032_R)

    # Fillet033
    fillet033_edges = [fillet036.edges().sort_by_distance(p)[0] for p in [
        (20.116872, -8.021937, 110),
    ]]
    fillet(fillet033_edges, radius=FILLET033_R)

    # Fillet034
    fillet034_edges = [fillet036.edges().sort_by_distance(p)[0] for p in [
        (46.580544, -8.021937, 80),
    ]]
    fillet(fillet034_edges, radius=FILLET034_R)

    # Fillet035
    fillet035_edges = [fillet036.edges().sort_by_distance(p)[0] for p in [
        (46.580544, -8.021937, 70),
    ]]
    fillet(fillet035_edges, radius=FILLET035_R)

    # Cut115: cut Pad049
    add(pad049.part, mode=Mode.SUBTRACT)

    # Cut116: cut Pad050
    add(pad050.part, mode=Mode.SUBTRACT)

    # Cut117: cut M031
    add(m031_2.part, mode=Mode.SUBTRACT)

    # Fillet036
    fillet036_edges = [fillet036.edges().sort_by_distance(p)[0] for p in [
        (33.024503, 0, 80),
    ]]
    fillet(fillet036_edges, radius=FILLET036_R)


with BuildPart() as fusion048:
    # Cylinder096 → Cylinder096 (new body)
    with BuildSketch(Plane.XY):
        Circle(CYLINDER096_R)
    extrude(amount=CYLINDER096_DEPTH)


with BuildPart() as fusion048_1:
    # Cylinder096 roll: moved
    add(fusion048.part.rotate(Axis((0, 0, 0), (1, 0, 0)), CYLINDER096_ROLL_ANGLE))


with BuildPart() as fusion048_2:
    # Cylinder096 placement: moved
    add(fusion048_1.part.moved(Location((33, -31, 75))))

    # Fusion047: union Cilindro050, Fillet036
    add(cilindro050_2.part)
    add(fillet036.part)

    # Cut118: cut Cilindro053
    add(cilindro053_2.part, mode=Mode.SUBTRACT)

    # Cut119: cut Cilindro051
    add(cilindro051_2.part, mode=Mode.SUBTRACT)

    # Fusion048: union Cubo039
    add(cubo039.part)


with BuildPart() as effector001:
    # Sketch059 → Pad052 (new body)
    with BuildSketch(Plane.YZ.offset(13)):
        Polygon((24.25286, 93.889427), (24.25286, 56.014507), (-18.913932, 56.014507), (-18.913932, 109.960938), (0, 109.960938), (3.931488, 93.889427), align=None)
    extrude(amount=PAD052_DEPTH)

    # Fillet041
    fillet041_edges = [effector001.edges().sort_by_distance(p)[0] for p in [
        (33, -18.913932, 56.014507),
    ]]
    fillet(fillet041_edges, radius=FILLET041_R)

    # Fillet042
    fillet042_edges = [effector001.edges().sort_by_distance(p)[0] for p in [
        (33, 24.25286, 56.014507),
    ]]
    fillet(fillet042_edges, radius=FILLET042_R)

    # Fillet043
    fillet043_edges = [effector001.edges().sort_by_distance(p)[0] for p in [
        (33, 24.25286, 93.889427),
    ]]
    fillet(fillet043_edges, radius=FILLET043_R)

    # Fillet044
    fillet044_edges = [effector001.edges().sort_by_distance(p)[0] for p in [
        (33, 0, 109.960938),
    ]]
    fillet(fillet044_edges, radius=FILLET044_R)

    # Fusion049: union Fusion048
    add(fusion048_2.part)

    # Cut120: cut Cubo040
    add(cubo040.part, mode=Mode.SUBTRACT)

    # Cut123: cut Fusion054
    add(fusion054_2.part, mode=Mode.SUBTRACT)

    # Cut124: cut Fusion055
    add(fusion055_3.part, mode=Mode.SUBTRACT)

    # Cut136: cut M029
    add(m029_2.part, mode=Mode.SUBTRACT)

    # Cut137: cut M026
    add(m026_2.part, mode=Mode.SUBTRACT)


solid = effector001.part
